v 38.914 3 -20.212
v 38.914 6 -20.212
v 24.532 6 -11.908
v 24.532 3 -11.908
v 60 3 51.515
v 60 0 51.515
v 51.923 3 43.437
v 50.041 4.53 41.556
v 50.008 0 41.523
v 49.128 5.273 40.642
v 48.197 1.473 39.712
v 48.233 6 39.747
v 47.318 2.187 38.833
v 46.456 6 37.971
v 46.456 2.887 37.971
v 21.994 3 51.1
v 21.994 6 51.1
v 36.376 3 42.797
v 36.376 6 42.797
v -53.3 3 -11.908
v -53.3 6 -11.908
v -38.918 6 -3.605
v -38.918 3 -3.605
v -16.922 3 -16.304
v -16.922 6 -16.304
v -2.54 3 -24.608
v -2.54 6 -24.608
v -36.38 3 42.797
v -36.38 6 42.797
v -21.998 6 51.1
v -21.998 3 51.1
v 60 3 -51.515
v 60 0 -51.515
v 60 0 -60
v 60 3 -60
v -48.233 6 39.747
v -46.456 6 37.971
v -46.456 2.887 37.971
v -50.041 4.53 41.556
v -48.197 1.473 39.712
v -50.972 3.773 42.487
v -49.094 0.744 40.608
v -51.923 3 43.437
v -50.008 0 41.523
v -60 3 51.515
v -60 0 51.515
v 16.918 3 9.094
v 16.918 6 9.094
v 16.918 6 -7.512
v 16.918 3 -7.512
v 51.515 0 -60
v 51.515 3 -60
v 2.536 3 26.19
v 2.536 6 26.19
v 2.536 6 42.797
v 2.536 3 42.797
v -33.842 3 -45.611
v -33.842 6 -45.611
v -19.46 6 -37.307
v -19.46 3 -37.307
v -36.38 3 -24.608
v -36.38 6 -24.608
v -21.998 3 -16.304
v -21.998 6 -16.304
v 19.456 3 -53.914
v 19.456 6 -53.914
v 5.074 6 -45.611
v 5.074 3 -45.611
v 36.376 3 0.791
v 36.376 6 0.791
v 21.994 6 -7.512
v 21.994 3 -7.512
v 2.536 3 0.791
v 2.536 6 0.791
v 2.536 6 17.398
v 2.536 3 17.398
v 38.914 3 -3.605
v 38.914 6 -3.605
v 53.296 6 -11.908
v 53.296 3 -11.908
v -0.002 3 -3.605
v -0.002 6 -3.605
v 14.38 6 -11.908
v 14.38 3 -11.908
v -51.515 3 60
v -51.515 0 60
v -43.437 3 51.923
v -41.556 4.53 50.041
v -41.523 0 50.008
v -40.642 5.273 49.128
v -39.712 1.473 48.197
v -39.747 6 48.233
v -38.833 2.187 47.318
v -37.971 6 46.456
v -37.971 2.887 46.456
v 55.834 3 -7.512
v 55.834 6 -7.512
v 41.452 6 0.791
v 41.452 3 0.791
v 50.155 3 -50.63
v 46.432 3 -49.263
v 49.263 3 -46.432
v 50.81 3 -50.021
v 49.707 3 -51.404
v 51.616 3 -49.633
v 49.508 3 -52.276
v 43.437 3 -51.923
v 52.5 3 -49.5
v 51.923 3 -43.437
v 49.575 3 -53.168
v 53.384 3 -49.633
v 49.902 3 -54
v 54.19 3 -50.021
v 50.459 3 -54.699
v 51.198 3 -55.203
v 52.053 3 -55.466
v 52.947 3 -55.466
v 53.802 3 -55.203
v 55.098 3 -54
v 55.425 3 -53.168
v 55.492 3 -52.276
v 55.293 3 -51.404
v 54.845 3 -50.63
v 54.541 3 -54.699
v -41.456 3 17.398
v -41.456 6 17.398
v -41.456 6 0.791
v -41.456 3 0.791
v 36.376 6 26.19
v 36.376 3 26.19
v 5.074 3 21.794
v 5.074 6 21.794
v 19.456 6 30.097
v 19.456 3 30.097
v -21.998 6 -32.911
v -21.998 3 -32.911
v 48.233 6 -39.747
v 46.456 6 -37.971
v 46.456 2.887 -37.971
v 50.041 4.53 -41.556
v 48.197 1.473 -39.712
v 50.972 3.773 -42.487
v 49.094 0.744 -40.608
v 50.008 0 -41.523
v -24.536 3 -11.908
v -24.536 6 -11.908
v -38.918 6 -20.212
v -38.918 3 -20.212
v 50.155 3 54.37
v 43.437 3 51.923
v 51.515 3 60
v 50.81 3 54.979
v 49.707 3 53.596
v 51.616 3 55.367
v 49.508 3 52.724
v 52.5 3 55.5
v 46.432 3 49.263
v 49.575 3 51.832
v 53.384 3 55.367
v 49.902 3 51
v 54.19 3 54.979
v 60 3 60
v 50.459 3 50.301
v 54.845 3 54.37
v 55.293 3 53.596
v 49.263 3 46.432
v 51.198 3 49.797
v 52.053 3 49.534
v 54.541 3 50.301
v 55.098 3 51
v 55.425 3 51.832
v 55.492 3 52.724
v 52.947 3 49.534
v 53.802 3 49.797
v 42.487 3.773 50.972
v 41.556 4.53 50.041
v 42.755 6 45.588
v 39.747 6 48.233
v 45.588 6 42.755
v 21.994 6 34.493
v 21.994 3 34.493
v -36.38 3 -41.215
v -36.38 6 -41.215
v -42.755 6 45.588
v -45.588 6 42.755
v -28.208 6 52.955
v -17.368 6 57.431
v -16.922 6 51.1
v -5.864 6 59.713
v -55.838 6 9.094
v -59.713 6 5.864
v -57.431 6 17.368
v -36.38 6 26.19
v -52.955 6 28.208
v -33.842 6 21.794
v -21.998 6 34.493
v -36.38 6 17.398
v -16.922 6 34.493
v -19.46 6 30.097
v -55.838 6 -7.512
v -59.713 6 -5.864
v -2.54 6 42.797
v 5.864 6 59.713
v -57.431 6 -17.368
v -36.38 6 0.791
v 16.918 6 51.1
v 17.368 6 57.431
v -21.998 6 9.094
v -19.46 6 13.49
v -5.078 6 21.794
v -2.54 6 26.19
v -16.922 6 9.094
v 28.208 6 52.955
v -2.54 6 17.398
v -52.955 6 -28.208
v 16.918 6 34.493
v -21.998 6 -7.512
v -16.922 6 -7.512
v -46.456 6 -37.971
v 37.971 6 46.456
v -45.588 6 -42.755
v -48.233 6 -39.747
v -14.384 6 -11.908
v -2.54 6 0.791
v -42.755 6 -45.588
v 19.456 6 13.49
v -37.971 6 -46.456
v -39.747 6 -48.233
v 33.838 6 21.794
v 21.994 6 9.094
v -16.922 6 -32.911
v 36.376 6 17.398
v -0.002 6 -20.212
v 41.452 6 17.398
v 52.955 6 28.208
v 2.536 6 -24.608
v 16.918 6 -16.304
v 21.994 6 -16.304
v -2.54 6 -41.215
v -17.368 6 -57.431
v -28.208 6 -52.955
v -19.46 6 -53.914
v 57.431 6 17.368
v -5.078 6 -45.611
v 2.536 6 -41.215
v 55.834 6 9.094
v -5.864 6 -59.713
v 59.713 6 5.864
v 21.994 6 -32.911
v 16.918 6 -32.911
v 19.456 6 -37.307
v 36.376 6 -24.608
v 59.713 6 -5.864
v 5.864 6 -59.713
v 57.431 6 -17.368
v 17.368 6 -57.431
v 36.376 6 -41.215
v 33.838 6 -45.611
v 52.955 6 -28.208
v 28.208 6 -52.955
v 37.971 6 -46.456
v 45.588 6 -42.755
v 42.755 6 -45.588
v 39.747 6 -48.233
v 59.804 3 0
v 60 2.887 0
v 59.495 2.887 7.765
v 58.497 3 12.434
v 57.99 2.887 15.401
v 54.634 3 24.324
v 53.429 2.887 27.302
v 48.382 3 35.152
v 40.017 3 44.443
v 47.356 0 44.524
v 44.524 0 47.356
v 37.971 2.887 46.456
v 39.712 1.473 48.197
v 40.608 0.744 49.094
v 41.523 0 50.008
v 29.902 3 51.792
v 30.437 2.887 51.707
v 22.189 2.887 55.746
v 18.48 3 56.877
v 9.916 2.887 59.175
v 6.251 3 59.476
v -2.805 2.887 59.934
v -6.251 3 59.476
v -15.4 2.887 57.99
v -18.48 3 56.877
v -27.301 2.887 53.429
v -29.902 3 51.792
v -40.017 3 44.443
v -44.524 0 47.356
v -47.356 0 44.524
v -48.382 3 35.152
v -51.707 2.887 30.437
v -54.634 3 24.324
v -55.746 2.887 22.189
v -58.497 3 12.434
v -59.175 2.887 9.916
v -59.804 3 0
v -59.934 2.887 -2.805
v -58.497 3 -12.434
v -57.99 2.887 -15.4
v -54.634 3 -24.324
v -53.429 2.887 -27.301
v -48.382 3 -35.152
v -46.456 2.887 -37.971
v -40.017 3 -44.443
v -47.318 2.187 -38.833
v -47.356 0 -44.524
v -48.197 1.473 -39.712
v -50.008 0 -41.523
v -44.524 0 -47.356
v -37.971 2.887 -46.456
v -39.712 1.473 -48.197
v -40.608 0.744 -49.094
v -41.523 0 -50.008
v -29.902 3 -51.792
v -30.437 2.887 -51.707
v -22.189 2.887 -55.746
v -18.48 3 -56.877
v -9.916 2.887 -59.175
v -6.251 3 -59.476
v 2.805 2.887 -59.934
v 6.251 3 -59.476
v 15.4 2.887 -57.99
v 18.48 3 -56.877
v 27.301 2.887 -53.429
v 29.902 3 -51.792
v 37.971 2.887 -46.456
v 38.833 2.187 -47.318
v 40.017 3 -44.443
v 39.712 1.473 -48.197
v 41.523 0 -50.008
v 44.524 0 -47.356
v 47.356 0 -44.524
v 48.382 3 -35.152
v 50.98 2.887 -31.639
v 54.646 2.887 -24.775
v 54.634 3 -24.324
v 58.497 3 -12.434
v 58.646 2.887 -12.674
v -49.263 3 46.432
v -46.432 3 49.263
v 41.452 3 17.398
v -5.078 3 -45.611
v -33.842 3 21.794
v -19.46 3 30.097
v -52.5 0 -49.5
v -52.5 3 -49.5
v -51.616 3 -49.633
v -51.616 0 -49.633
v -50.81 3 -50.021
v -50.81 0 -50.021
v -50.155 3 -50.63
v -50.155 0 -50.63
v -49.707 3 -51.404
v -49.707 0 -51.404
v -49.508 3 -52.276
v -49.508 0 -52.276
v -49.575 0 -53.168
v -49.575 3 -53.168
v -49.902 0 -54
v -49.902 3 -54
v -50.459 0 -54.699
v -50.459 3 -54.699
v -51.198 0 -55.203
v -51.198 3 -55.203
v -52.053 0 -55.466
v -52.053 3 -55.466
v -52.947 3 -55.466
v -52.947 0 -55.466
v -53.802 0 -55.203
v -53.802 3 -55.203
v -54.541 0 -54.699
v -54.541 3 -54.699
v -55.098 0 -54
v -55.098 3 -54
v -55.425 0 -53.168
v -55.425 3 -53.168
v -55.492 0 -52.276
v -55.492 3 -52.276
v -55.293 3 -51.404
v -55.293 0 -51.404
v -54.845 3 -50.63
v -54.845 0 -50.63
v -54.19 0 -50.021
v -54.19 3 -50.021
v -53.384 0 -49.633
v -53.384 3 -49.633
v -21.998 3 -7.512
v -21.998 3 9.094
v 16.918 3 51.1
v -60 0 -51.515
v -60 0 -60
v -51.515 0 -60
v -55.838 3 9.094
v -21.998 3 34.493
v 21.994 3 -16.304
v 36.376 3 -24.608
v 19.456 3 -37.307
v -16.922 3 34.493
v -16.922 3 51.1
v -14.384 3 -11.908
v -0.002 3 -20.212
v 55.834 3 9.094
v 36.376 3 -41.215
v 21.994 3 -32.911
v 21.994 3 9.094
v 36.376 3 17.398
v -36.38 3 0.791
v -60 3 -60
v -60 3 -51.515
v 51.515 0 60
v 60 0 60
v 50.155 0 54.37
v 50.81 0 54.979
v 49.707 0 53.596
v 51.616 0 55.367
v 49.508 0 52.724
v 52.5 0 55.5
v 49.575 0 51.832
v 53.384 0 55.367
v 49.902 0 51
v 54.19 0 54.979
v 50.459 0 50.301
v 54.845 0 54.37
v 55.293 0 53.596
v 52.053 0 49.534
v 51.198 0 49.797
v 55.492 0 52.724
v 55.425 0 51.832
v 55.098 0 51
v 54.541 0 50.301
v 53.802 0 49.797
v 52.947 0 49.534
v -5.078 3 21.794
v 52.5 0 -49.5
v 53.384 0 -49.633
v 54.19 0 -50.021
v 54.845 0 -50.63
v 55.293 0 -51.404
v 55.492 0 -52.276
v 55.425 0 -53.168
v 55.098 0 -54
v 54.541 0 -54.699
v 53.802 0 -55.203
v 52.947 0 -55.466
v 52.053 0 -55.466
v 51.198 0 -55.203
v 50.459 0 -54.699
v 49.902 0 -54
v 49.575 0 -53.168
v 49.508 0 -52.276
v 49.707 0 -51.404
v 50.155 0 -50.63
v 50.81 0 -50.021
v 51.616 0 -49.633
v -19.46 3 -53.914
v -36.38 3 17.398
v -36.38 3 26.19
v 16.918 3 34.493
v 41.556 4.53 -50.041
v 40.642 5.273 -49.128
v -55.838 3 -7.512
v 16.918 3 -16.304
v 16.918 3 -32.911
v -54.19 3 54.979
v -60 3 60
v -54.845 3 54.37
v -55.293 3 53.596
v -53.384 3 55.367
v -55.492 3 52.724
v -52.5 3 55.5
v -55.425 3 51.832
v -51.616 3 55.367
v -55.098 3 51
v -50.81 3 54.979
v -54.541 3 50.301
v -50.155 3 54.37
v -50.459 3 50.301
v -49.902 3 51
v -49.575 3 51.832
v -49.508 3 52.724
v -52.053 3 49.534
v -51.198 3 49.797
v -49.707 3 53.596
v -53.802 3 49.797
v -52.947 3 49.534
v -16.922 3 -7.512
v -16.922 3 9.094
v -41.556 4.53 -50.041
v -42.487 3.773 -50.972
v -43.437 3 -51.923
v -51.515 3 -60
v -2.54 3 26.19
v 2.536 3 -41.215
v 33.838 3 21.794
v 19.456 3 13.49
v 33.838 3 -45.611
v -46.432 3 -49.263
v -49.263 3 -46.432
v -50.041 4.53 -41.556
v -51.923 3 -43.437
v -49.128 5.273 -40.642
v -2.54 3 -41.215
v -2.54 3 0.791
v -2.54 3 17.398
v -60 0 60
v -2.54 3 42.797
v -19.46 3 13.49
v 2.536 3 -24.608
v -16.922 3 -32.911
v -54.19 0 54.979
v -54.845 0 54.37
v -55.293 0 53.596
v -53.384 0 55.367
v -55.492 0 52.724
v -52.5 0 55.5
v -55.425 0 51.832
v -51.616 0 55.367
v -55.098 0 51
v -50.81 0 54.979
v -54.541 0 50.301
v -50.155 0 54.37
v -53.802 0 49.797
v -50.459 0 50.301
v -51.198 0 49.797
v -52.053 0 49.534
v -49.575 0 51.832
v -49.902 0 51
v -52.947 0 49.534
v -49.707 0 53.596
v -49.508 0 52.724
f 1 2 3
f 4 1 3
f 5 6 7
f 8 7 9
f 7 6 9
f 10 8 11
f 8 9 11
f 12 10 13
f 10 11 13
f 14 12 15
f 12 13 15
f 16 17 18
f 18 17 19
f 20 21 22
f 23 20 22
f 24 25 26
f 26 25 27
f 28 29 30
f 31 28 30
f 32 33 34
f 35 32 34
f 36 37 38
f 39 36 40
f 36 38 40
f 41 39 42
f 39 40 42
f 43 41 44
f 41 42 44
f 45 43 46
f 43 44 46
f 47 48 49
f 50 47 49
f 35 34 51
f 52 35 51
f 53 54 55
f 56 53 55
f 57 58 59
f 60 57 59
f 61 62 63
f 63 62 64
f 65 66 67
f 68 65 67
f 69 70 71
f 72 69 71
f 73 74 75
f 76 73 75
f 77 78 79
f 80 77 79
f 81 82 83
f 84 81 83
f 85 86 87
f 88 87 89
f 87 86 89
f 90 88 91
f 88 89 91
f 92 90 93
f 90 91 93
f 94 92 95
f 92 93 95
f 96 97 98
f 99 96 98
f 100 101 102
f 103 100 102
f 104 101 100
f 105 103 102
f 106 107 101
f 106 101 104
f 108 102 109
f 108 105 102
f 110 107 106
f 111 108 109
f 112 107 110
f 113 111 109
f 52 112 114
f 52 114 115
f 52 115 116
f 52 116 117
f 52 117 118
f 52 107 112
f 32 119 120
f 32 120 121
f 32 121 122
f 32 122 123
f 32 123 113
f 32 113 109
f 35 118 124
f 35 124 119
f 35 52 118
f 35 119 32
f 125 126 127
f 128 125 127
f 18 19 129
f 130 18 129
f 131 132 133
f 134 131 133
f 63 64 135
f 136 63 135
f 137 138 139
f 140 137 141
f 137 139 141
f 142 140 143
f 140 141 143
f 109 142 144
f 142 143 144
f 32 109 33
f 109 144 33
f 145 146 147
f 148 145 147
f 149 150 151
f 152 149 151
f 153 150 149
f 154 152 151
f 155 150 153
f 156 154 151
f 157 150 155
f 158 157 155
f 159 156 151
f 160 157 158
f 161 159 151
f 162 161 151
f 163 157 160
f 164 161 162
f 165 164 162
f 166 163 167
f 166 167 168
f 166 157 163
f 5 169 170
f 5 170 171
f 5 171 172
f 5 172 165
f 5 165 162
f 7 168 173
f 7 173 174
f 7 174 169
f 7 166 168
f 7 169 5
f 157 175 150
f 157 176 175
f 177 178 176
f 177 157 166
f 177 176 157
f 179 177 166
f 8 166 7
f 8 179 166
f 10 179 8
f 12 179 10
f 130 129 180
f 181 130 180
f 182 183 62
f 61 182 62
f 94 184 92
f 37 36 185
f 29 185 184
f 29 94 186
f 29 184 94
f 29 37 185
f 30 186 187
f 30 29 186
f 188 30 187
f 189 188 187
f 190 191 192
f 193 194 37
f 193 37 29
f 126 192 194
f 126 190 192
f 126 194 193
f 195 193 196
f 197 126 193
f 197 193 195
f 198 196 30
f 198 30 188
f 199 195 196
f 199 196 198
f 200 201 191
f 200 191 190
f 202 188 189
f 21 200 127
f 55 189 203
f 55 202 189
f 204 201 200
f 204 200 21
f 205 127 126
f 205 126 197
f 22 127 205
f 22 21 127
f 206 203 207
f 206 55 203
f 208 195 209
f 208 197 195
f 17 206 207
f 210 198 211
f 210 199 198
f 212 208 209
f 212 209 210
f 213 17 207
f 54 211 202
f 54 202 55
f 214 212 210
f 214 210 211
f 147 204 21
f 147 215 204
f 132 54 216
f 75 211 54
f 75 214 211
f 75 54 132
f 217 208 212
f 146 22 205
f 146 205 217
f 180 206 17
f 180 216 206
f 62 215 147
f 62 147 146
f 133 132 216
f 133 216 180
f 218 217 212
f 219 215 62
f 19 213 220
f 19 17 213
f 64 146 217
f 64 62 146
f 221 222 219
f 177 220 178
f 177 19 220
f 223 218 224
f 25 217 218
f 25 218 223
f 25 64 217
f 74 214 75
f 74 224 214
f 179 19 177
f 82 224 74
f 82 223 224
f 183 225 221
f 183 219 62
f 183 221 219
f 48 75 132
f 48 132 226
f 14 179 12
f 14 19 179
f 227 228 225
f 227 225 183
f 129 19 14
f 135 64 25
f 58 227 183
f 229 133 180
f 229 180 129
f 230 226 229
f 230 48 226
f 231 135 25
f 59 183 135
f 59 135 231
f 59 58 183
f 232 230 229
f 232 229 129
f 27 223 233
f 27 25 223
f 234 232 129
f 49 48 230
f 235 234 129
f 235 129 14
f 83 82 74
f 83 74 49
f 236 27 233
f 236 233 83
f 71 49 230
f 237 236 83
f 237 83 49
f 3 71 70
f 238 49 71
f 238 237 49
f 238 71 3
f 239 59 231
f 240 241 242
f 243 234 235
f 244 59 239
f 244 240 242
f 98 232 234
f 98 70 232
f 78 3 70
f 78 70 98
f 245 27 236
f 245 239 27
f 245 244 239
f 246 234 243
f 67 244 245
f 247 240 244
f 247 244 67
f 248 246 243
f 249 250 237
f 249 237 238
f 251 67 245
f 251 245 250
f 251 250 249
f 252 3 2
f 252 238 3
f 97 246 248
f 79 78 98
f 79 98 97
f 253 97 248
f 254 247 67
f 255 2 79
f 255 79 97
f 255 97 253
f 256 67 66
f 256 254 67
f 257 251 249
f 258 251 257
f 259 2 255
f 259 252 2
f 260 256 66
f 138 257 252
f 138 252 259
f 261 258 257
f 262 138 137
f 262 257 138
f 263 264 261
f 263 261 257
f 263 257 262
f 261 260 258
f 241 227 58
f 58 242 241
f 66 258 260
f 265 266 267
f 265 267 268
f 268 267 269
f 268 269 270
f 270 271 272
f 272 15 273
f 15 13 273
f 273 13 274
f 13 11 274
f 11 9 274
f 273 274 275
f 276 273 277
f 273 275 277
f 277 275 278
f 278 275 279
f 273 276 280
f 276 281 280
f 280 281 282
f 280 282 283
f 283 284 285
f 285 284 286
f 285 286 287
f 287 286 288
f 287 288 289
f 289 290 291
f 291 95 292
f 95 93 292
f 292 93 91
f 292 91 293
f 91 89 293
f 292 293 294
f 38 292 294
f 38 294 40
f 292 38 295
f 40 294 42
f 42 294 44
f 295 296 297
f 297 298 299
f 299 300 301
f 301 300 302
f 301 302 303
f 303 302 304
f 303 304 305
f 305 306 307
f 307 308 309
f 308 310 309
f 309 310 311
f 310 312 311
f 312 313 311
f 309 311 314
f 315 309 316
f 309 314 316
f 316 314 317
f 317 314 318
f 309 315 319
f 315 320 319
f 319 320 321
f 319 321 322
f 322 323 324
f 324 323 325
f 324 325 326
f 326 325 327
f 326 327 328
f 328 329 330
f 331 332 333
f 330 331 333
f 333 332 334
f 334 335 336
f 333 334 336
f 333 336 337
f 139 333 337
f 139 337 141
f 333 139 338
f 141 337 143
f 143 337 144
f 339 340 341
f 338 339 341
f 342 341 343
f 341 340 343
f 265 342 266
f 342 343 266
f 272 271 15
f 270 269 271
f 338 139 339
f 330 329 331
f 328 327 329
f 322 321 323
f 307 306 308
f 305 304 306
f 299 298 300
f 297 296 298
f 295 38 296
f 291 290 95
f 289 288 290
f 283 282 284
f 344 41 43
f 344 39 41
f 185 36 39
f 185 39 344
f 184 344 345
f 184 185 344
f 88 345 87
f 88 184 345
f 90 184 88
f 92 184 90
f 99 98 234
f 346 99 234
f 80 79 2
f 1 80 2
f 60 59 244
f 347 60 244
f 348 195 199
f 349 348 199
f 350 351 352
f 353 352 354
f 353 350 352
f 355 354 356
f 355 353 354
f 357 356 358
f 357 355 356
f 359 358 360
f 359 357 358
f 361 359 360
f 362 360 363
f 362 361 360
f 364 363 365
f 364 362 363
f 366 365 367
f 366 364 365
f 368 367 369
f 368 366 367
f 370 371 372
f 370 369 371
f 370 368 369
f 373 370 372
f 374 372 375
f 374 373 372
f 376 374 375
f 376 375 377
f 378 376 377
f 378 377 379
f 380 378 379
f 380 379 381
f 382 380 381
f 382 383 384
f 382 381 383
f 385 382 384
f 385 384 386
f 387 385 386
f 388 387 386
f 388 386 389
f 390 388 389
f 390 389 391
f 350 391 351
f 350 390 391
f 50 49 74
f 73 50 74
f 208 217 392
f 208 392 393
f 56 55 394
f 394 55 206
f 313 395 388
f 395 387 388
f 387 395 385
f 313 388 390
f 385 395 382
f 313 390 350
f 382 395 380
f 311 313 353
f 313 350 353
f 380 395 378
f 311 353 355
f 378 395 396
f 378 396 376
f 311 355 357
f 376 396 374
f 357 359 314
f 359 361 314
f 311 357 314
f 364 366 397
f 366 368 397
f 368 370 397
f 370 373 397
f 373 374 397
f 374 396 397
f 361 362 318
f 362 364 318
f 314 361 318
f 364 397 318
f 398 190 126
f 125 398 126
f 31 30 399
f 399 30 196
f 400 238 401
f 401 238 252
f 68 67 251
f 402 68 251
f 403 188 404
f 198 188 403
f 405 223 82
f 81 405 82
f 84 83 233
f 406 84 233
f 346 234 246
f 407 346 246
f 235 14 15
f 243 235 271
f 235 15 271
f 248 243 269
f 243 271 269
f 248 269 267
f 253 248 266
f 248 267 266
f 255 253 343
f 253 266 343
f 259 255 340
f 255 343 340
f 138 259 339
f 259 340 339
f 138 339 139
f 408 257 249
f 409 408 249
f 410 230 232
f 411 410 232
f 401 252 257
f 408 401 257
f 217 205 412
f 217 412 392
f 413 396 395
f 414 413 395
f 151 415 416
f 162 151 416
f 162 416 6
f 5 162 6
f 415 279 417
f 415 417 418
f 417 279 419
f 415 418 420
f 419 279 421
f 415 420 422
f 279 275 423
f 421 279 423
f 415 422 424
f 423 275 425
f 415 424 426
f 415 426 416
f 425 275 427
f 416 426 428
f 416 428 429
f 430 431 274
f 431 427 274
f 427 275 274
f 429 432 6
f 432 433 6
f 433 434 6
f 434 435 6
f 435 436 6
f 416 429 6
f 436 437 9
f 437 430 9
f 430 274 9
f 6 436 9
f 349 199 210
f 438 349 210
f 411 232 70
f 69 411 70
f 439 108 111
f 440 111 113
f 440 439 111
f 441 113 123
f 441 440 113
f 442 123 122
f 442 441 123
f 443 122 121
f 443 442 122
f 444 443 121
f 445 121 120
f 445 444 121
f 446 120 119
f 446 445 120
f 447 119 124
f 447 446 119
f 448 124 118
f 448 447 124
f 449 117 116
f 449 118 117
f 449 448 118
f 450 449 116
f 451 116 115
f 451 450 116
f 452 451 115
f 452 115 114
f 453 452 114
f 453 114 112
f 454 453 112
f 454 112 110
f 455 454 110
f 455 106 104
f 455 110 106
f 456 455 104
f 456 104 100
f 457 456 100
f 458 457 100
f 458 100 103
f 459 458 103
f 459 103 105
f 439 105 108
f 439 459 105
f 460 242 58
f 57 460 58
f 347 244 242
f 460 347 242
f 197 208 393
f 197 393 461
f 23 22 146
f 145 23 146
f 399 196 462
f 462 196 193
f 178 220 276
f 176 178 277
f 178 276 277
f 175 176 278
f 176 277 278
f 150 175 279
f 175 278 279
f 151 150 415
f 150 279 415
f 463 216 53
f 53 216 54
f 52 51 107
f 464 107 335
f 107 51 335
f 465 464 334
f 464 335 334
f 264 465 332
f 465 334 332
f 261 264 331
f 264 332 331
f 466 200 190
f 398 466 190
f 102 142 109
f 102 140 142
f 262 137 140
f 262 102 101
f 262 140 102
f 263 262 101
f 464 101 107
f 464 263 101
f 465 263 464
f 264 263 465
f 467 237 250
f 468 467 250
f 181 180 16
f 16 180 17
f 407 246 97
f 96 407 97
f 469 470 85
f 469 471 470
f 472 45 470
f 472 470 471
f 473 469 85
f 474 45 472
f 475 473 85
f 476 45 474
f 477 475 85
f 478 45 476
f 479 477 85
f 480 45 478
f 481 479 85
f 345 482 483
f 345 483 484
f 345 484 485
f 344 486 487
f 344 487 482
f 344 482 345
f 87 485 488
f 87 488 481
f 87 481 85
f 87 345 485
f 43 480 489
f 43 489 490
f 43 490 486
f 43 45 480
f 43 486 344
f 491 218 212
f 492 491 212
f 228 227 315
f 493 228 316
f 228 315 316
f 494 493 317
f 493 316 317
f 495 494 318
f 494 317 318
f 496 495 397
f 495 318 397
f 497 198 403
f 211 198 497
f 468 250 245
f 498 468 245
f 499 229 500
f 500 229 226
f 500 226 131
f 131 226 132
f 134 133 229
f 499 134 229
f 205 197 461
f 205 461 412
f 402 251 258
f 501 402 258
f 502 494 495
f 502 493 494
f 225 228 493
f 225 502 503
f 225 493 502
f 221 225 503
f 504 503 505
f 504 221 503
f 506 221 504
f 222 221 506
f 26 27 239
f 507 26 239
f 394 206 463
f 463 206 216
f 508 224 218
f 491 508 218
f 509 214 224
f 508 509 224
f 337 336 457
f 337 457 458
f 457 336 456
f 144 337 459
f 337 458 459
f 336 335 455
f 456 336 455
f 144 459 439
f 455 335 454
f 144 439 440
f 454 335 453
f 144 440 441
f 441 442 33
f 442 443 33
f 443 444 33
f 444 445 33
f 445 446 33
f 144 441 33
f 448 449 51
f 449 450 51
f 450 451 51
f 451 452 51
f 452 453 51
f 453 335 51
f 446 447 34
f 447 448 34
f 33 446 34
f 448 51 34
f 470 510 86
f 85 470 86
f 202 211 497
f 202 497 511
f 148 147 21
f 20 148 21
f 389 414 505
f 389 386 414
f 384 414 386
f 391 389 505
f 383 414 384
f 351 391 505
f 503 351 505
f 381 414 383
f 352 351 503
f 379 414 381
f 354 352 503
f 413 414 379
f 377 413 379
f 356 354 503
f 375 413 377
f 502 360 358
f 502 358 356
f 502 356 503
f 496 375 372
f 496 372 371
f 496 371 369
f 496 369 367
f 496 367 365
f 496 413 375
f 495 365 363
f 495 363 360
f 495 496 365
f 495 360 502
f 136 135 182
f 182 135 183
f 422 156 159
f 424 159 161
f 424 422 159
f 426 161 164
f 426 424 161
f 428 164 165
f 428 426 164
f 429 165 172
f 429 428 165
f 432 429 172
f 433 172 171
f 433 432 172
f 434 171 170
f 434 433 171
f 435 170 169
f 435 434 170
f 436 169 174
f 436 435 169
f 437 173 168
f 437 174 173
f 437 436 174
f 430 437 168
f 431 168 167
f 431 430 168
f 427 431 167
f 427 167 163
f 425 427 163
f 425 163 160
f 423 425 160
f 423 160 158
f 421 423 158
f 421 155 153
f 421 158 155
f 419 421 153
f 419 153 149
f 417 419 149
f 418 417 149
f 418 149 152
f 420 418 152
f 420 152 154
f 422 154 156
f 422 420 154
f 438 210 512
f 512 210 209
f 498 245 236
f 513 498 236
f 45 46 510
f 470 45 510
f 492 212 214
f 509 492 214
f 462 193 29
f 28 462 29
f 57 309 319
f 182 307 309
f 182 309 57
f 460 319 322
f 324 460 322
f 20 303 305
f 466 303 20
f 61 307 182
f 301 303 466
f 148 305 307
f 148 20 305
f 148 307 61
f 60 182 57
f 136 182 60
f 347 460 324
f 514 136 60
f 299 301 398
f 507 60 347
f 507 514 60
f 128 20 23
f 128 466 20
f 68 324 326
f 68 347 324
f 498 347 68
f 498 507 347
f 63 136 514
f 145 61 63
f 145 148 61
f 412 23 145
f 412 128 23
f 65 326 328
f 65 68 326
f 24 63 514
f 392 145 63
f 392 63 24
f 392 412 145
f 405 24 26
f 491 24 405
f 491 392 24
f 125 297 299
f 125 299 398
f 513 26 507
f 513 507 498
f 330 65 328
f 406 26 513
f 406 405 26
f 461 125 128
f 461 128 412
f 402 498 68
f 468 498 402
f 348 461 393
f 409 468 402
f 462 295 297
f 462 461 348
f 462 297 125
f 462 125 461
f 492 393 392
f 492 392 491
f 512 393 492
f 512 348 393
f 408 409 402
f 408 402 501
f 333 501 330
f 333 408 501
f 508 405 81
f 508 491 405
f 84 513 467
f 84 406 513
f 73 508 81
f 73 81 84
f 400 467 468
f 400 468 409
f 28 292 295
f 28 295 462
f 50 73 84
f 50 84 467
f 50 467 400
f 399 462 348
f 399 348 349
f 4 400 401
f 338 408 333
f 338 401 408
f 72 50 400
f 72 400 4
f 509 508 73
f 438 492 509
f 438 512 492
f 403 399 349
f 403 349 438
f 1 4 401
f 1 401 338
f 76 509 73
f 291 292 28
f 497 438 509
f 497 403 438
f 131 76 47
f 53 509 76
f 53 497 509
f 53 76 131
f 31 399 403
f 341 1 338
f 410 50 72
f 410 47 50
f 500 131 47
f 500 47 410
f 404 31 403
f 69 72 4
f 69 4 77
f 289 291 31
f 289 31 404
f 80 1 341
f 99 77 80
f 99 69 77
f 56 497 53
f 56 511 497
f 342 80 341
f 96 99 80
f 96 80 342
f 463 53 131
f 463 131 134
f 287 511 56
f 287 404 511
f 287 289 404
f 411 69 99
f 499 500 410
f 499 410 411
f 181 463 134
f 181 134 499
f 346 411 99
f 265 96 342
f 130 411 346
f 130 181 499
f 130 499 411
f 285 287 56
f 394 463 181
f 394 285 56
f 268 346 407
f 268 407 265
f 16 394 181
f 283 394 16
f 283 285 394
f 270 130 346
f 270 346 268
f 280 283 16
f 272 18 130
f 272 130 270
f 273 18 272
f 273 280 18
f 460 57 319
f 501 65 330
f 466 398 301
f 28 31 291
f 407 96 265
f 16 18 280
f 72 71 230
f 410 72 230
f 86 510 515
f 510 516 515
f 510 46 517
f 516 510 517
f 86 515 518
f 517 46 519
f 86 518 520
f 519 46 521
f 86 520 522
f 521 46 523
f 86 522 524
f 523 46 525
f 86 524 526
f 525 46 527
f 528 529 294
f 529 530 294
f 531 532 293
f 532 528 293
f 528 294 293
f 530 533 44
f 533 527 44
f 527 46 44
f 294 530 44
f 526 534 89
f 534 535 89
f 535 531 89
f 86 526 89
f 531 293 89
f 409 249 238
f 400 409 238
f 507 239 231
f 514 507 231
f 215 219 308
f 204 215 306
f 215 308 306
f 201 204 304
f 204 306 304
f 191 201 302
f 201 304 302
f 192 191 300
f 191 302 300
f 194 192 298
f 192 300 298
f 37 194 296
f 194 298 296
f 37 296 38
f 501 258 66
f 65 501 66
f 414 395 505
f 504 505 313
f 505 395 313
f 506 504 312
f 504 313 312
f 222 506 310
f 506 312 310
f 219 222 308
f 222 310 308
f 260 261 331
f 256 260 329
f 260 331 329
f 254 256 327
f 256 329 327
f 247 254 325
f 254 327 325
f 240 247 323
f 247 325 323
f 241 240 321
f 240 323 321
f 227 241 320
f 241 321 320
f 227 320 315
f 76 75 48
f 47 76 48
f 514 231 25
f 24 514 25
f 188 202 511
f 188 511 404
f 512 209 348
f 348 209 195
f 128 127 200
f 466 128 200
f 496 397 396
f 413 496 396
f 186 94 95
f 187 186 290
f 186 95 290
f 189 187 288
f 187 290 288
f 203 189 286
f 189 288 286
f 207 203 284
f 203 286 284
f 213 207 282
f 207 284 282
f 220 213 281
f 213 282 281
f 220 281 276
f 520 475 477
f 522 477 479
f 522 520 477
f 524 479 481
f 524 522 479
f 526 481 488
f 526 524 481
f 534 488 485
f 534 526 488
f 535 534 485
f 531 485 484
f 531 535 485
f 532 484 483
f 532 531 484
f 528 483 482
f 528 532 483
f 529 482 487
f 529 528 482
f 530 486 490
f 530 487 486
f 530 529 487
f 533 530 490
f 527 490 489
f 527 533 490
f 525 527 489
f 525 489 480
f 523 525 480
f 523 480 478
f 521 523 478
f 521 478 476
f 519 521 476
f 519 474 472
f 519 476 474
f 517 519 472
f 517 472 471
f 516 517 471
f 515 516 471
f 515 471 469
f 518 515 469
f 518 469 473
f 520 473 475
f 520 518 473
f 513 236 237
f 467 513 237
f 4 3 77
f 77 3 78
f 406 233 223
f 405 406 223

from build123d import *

# Parameters (mm, degrees)
SKETCH_1_R          = 3
EXTRUDE_1_DEPTH     = 6
SKETCH_2_R          = 65
CUT_EXTRUDE_1_DEPTH = 3
CUT_EXTRUDE_1_DRAFT = -60
SKETCH_3_OUTSIDE_W  = 166.354
SKETCH_3_OUTSIDE_H  = 166.354
SKETCH_3_OUTSIDE_R  = 62.5
CUT_EXTRUDE_2_DEPTH = 3
CUT_EXTRUDE_2_DRAFT = -60
CUT_EXTRUDE1_DEPTH  = 86.064681421


with BuildPart() as part:
    # Эскиз1 → Бобышка-Вытянуть1 (new body)
    with BuildSketch(Plane(origin=(0, 0, 0), x_dir=(1, 0, 0), z_dir=(0, 1, 0))):
        with BuildLine():
            Line((-51.514718626, -60), (-37.971101151, -46.456382526))
            ThreePointArc((-37.971101151, -46.456382526), (0, -60), (37.971101151, -46.456382526))
            Line((37.971101151, -46.456382526), (51.514718626, -60))
            Line((51.514718626, -60), (60, -60))
            Line((60, -60), (60, -51.514718626))
            Line((60, -51.514718626), (46.456382526, -37.971101151))
            ThreePointArc((46.456382526, -37.971101151), (60, 0), (46.456382526, 37.971101151))
            Line((46.456382526, 37.971101151), (60, 51.514718626))
            Line((60, 51.514718626), (60, 60))
            Line((60, 60), (51.514718626, 60))
            Line((51.514718626, 60), (37.971101151, 46.456382526))
            ThreePointArc((37.971101151, 46.456382526), (0, 60), (-37.971101151, 46.456382526))
            Line((-37.971101151, 46.456382526), (-51.514718626, 60))
            Line((-51.514718626, 60), (-60, 60))
            Line((-60, 60), (-60, 51.514718626))
            Line((-60, 51.514718626), (-46.456382526, 37.971101151))
            ThreePointArc((-46.456382526, 37.971101151), (-60, 0), (-46.456382526, -37.971101151))
            Line((-46.456382526, -37.971101151), (-60, -51.514718626))
            Line((-60, -51.514718626), (-60, -60))
            Line((-60, -60), (-51.514718626, -60))
        make_face()
        with Locations(Location((-52.5, -52.5, 0), (0, 0, 270))):
            Circle(SKETCH_1_R, mode=Mode.SUBTRACT)
        with Locations(Location((-52.5, 52.5, 0), (0, 0, 270))):
            Circle(SKETCH_1_R, mode=Mode.SUBTRACT)
        with Locations(Location((52.5, 52.5, 0), (0, 0, 270))):
            Circle(SKETCH_1_R, mode=Mode.SUBTRACT)
        with Locations(Location((52.5, -52.5, 0), (0, 0, 270))):
            Circle(SKETCH_1_R, mode=Mode.SUBTRACT)
        with BuildLine():
            Line((2.73923518, 6.981875867), (6.459180807, 10.701821494))
            ThreePointArc((6.459180807, 10.701821494), (0, 12.5), (-6.459180807, 10.701821494))
            Line((-6.459180807, 10.701821494), (-2.73923518, 6.981875867))
            ThreePointArc((-2.73923518, 6.981875867), (0, 7.5), (2.73923518, 6.981875867))
        make_face(mode=Mode.SUBTRACT)
    extrude(amount=EXTRUDE_1_DEPTH)


with BuildPart() as cut_extrude_1_tool:
    # Эскиз2 → Вырез-Вытянуть1 (with draft: the straight prism first)
    with BuildSketch(Plane.XZ):
        Circle(SKETCH_2_R)
    extrude(amount=-CUT_EXTRUDE_1_DEPTH)
    # Вырез-Вытянуть1: the draft: its side faces are tilted about the plane it starts from
    cut_extrude_1_sides = [cut_extrude_1_tool.faces().sort_by_distance(p)[0] for p in [
        (-65, 1.5, 0),
    ]]
    draft(cut_extrude_1_sides, Plane.XZ, CUT_EXTRUDE_1_DRAFT)


with BuildPart() as part_1:
    add(part.part)

    # Вырез-Вытянуть1: cut by cut_extrude_1_tool
    add(cut_extrude_1_tool.part, mode=Mode.SUBTRACT)


with BuildPart() as cut_extrude_2_tool:
    # Эскиз3 outside → Вырез-Вытянуть2 (with draft: the straight prism first)
    with BuildSketch(Plane(origin=(0, 6, 0), x_dir=(1, 0, 0), z_dir=(0, 1, 0))):
        Rectangle(SKETCH_3_OUTSIDE_W, SKETCH_3_OUTSIDE_H)
        Circle(SKETCH_3_OUTSIDE_R, mode=Mode.SUBTRACT)
    extrude(amount=-CUT_EXTRUDE_2_DEPTH)
    # Вырез-Вытянуть2: the draft: its side faces are tilted about the plane it starts from
    cut_extrude_2_sides = [cut_extrude_2_tool.faces().sort_by_distance(p)[0] for p in [
        (0, 4.5, 83.177),
        (83.177, 4.5, 0),
        (0, 4.5, -83.177),
        (-83.177, 4.5, 0),
        (-62.5, 4.5, 0),
    ]]
    draft(cut_extrude_2_sides, Plane(origin=(0, 6, 0), x_dir=(1, 0, 0), z_dir=(0, 1, 0)), CUT_EXTRUDE_2_DRAFT)


with BuildPart() as part_2:
    add(part_1.part)

    # Вырез-Вытянуть2: cut by cut_extrude_2_tool
    add(cut_extrude_2_tool.part, mode=Mode.SUBTRACT)

    # Sketch1 → Cut-Extrude1 (cut, through all)
    with BuildSketch(Plane(origin=(0, 6, 0), x_dir=(1, 0, 0), z_dir=(0, 1, 0))):
        Polygon((19.45563956, 53.914075196), (5.07363956, 45.610623625), (19.45563956, 37.307172053), (33.83763956, 45.610623625), align=None)
        Polygon((2.53563956, 41.214678675), (2.53563956, 24.607775532), (16.91763956, 16.30432396), (16.91763956, 32.911227103), align=None)
        Polygon((21.99363956, 16.30432396), (36.37563956, 24.607775532), (36.37563956, 41.214678675), (21.99363956, 32.911227103), align=None)
        Polygon((-19.46036044, 53.914075196), (-33.84236044, 45.610623625), (-19.46036044, 37.307172053), (-5.07836044, 45.610623625), align=None)
        Polygon((-36.38036044, 41.214678675), (-36.38036044, 24.607775532), (-21.99836044, 16.30432396), (-21.99836044, 32.911227103), align=None)
        Polygon((-16.92236044, 16.30432396), (-2.54036044, 24.607775532), (-2.54036044, 41.214678675), (-16.92236044, 32.911227103), align=None)
        Polygon((38.91363956, 20.211830582), (24.53163956, 11.908379011), (38.91363956, 3.604927439), (53.29563956, 11.908379011), align=None)
        Polygon((21.99363956, 7.512434061), (21.99363956, -9.094469082), (36.37563956, -17.397920653), (36.37563956, -0.79101751), align=None)
        Polygon((41.45163956, -17.397920653), (55.83363956, -9.094469082), (55.83363956, 7.512434061), (41.45163956, -0.79101751), align=None)
        Polygon((-2.54036044, -42.796713695), (-16.92236044, -51.100165267), (-16.92236044, -34.493262124), (-2.54036044, -26.189810552), align=None)
        Polygon((19.45563956, -13.490414031), (5.07363956, -21.793865603), (19.45563956, -30.097317174), (33.83763956, -21.793865603), align=None)
        Polygon((2.53563956, -26.189810552), (2.53563956, -42.796713695), (16.91763956, -51.100165267), (16.91763956, -34.493262124), align=None)
        Polygon((21.99363956, -51.100165267), (36.37563956, -42.796713695), (36.37563956, -26.189810552), (21.99363956, -34.493262124), align=None)
        Polygon((-19.46036044, -13.490414031), (-33.84236044, -21.793865603), (-19.46036044, -30.097317174), (-5.07836044, -21.793865603), align=None)
        Polygon((-36.38036044, -26.189810552), (-36.38036044, -42.796713695), (-21.99836044, -51.100165267), (-21.99836044, -34.493262124), align=None)
        Polygon((-21.99836044, -9.094469082), (-36.38036044, -17.397920653), (-36.38036044, -0.79101751), (-21.99836044, 7.512434061), align=None)
        Polygon((-0.00236044, 20.211830582), (-14.38436044, 11.908379011), (-0.00236044, 3.604927439), (14.37963956, 11.908379011), align=None)
        Polygon((-16.92236044, 7.512434061), (-16.92236044, -9.094469082), (-2.54036044, -17.397920653), (-2.54036044, -0.79101751), align=None)
        Polygon((2.53563956, -17.397920653), (16.91763956, -9.094469082), (16.91763956, 7.512434061), (2.53563956, -0.79101751), align=None)
        Polygon((-38.91836044, 20.211830582), (-53.30036044, 11.908379011), (-38.91836044, 3.604927439), (-24.53636044, 11.908379011), align=None)
        Polygon((-55.83836044, 7.512434061), (-55.83836044, -9.094469082), (-41.45636044, -17.397920653), (-41.45636044, -0.79101751), align=None)
    extrude(amount=-CUT_EXTRUDE1_DEPTH, mode=Mode.SUBTRACT)


solid = part_2.part
